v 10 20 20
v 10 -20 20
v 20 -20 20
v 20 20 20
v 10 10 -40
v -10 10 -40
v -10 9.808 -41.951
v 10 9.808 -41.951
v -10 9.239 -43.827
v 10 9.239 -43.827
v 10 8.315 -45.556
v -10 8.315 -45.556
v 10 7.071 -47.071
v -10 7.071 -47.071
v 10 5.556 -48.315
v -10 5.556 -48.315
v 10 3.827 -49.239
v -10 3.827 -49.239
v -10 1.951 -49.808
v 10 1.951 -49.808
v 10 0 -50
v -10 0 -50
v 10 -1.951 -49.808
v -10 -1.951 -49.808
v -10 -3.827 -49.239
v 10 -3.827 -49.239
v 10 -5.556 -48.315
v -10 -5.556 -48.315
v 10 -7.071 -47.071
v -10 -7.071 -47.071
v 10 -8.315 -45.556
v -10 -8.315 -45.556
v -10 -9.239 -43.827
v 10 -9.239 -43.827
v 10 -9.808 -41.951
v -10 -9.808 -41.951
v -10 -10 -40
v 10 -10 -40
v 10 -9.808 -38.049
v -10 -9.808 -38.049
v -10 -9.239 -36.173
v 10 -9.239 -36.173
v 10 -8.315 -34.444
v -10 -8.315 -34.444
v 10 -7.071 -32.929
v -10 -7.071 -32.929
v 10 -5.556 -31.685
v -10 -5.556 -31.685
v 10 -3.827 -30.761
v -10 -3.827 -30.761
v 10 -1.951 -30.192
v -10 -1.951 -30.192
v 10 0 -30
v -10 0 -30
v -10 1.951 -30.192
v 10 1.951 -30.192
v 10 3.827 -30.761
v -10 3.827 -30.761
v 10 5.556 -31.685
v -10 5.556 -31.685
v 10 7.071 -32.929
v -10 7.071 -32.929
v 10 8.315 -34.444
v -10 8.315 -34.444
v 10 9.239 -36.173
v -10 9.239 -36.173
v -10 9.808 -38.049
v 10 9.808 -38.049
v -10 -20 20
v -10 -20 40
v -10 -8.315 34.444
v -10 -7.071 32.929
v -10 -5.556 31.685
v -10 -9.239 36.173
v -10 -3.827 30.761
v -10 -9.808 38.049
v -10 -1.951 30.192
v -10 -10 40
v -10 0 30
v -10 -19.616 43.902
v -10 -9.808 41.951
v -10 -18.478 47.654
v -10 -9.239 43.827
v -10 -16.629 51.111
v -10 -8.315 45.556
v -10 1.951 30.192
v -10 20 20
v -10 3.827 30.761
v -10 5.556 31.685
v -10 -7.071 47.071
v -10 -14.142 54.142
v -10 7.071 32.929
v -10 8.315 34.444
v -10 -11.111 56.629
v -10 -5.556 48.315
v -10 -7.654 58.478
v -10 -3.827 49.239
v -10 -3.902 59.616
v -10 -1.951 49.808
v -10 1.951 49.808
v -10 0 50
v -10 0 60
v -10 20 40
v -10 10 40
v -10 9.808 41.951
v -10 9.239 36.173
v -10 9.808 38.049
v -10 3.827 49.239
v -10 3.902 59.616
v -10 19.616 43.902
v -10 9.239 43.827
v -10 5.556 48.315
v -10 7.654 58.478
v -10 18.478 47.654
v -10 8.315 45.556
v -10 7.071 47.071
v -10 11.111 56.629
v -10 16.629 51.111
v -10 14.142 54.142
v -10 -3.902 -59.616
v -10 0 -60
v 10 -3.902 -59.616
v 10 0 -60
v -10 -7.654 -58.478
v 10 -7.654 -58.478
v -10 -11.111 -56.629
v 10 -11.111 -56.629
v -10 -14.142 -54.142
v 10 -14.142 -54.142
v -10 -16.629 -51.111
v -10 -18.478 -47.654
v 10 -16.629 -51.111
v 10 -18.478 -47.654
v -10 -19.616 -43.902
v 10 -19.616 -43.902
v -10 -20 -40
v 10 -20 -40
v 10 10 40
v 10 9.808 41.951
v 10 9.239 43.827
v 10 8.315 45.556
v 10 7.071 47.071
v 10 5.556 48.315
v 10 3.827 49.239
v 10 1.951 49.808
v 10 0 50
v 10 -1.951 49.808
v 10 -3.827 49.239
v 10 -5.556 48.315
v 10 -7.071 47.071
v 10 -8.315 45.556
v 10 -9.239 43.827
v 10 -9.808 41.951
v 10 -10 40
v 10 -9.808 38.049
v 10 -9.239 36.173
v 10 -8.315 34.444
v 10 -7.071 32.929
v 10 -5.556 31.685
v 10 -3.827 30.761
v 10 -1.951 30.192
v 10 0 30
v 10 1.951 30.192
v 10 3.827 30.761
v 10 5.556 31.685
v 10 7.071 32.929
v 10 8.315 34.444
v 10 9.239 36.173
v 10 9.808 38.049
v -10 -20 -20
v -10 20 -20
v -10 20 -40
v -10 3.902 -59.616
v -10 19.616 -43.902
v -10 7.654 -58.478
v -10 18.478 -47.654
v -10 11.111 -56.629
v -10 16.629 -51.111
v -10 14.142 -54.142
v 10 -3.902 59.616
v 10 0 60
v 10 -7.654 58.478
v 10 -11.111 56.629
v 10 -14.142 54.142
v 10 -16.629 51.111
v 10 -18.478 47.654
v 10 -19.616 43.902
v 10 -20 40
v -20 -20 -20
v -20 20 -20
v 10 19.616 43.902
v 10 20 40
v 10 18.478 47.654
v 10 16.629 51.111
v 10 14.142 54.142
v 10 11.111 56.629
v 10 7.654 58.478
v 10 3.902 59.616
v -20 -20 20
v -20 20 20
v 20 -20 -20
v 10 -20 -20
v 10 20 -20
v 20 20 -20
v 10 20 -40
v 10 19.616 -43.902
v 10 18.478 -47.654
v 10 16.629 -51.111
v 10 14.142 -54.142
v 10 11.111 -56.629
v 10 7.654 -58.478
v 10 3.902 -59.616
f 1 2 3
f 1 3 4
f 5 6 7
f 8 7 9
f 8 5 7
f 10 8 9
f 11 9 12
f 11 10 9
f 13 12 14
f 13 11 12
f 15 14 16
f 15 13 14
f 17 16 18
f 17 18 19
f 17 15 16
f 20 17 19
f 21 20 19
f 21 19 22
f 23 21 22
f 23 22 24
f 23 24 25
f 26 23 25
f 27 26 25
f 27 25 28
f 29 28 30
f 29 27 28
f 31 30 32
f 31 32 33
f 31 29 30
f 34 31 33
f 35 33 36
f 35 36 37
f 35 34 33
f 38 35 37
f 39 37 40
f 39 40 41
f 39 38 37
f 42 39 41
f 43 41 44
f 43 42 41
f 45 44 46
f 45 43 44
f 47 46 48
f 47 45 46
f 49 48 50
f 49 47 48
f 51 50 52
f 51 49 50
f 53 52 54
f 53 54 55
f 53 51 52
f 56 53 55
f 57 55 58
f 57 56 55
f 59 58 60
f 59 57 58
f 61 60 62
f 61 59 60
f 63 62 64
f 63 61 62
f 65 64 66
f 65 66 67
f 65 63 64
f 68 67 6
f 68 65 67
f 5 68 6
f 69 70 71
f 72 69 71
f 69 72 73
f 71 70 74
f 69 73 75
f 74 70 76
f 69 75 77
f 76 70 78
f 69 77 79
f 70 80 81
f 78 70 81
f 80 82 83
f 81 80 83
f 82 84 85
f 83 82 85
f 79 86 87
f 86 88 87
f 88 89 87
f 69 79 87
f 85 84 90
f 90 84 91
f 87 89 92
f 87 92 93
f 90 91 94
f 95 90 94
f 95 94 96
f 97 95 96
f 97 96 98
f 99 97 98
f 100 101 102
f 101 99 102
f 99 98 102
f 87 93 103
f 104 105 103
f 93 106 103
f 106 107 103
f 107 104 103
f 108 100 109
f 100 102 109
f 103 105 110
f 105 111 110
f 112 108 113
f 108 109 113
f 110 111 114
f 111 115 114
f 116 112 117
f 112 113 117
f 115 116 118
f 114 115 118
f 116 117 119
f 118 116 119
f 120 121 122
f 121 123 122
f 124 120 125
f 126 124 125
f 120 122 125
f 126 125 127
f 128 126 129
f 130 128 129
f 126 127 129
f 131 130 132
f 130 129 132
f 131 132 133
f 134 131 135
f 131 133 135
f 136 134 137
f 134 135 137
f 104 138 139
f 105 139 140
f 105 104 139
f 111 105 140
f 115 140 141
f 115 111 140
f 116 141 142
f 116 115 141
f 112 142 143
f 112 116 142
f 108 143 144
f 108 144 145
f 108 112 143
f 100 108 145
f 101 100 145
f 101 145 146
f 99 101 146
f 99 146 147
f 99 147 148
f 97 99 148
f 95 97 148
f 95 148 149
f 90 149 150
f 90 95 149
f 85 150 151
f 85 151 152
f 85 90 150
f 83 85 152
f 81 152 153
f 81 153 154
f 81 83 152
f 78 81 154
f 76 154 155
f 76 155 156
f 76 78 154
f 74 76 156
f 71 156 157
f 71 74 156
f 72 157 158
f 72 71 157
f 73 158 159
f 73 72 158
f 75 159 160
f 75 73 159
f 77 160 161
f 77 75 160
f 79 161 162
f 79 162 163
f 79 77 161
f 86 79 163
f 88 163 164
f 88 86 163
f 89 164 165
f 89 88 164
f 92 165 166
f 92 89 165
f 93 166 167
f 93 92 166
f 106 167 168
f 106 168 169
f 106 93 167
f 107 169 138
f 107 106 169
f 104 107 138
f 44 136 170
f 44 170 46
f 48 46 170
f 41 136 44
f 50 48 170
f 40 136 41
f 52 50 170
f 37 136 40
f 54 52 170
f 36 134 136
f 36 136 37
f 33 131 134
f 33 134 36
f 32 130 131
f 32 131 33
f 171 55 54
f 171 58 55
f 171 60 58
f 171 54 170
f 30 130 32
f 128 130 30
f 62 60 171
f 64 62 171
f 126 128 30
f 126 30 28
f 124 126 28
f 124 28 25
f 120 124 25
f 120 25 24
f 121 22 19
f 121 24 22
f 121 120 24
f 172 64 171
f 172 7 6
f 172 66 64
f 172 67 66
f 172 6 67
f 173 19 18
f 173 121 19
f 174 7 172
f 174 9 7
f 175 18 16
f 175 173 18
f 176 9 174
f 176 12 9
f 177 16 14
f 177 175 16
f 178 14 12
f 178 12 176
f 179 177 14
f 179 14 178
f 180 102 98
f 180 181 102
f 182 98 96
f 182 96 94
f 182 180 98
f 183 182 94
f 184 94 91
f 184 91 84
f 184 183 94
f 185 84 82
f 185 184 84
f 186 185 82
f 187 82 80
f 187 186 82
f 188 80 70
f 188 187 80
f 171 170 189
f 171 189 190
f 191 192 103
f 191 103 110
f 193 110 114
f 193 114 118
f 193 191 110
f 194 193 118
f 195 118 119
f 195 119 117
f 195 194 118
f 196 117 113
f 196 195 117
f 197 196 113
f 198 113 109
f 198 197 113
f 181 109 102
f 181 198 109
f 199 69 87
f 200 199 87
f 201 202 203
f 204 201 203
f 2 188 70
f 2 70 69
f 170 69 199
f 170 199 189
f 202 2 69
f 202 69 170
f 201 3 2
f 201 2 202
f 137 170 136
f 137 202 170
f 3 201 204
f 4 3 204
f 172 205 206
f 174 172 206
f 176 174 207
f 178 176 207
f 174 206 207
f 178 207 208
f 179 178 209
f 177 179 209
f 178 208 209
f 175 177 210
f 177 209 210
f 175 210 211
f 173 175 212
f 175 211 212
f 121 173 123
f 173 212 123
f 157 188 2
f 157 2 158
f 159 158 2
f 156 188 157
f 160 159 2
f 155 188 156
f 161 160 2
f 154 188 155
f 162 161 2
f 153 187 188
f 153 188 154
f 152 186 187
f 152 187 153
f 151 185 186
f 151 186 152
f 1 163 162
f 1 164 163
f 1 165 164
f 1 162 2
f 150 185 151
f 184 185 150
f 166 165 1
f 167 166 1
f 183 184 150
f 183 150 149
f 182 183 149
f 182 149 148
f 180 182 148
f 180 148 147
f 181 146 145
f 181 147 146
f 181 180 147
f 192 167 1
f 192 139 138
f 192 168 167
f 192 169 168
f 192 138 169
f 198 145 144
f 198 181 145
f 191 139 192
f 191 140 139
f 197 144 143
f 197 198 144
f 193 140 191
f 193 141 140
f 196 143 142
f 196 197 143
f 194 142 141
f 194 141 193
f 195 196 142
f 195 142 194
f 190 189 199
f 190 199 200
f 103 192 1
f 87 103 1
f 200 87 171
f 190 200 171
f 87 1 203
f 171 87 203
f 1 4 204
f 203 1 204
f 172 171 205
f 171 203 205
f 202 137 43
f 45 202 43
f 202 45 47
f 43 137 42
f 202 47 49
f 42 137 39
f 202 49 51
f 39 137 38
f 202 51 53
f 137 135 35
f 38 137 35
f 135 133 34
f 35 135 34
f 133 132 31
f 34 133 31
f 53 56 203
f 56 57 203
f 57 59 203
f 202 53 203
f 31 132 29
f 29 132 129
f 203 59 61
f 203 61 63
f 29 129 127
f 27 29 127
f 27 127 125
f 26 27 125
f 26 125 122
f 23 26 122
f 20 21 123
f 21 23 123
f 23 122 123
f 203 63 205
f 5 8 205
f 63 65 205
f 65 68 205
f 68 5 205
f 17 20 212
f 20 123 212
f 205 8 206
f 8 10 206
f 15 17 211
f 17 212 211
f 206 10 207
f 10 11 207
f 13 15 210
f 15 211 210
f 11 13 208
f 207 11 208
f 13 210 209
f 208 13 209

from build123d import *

# Parameters (mm, degrees)
F0_R     = 10
F1_DEPTH = 10
F2_W     = 40
F2_H     = 20
F3_DEPTH = 10


with BuildPart() as f1:
    # F0 (on Right) → F1 (new body)
    with BuildSketch(Plane.YZ):
        with BuildLine():
            Line((-20, 40), (-20, 0))
            Line((-20, 0), (20, 0))
            Line((20, 0), (20, 40))
            ThreePointArc((20, 40), (14.142136, 54.142136), (0, 60))
            ThreePointArc((0, 60), (-14.142136, 54.142136), (-20, 40))
        make_face()
        with Locations((0, 40)):
            Circle(F0_R, mode=Mode.SUBTRACT)
    extrude(amount=F1_DEPTH)

    # F2 (on face) → F3 (join)
    with BuildSketch(Plane.YZ.offset(10)):
        with Locations((0, 10)):
            Rectangle(F2_W, F2_H)
    extrude(amount=F3_DEPTH)

    # F4: F1 across plane


with BuildPart() as f1_1:
    add(f1.part)
    add(f1.part.mirror(Plane.YZ))

    # F5: F1 across plane


with BuildPart() as f1_2:
    add(f1_1.part)
    add(f1_1.part.mirror(Plane.XY))


solid = f1_2.part
